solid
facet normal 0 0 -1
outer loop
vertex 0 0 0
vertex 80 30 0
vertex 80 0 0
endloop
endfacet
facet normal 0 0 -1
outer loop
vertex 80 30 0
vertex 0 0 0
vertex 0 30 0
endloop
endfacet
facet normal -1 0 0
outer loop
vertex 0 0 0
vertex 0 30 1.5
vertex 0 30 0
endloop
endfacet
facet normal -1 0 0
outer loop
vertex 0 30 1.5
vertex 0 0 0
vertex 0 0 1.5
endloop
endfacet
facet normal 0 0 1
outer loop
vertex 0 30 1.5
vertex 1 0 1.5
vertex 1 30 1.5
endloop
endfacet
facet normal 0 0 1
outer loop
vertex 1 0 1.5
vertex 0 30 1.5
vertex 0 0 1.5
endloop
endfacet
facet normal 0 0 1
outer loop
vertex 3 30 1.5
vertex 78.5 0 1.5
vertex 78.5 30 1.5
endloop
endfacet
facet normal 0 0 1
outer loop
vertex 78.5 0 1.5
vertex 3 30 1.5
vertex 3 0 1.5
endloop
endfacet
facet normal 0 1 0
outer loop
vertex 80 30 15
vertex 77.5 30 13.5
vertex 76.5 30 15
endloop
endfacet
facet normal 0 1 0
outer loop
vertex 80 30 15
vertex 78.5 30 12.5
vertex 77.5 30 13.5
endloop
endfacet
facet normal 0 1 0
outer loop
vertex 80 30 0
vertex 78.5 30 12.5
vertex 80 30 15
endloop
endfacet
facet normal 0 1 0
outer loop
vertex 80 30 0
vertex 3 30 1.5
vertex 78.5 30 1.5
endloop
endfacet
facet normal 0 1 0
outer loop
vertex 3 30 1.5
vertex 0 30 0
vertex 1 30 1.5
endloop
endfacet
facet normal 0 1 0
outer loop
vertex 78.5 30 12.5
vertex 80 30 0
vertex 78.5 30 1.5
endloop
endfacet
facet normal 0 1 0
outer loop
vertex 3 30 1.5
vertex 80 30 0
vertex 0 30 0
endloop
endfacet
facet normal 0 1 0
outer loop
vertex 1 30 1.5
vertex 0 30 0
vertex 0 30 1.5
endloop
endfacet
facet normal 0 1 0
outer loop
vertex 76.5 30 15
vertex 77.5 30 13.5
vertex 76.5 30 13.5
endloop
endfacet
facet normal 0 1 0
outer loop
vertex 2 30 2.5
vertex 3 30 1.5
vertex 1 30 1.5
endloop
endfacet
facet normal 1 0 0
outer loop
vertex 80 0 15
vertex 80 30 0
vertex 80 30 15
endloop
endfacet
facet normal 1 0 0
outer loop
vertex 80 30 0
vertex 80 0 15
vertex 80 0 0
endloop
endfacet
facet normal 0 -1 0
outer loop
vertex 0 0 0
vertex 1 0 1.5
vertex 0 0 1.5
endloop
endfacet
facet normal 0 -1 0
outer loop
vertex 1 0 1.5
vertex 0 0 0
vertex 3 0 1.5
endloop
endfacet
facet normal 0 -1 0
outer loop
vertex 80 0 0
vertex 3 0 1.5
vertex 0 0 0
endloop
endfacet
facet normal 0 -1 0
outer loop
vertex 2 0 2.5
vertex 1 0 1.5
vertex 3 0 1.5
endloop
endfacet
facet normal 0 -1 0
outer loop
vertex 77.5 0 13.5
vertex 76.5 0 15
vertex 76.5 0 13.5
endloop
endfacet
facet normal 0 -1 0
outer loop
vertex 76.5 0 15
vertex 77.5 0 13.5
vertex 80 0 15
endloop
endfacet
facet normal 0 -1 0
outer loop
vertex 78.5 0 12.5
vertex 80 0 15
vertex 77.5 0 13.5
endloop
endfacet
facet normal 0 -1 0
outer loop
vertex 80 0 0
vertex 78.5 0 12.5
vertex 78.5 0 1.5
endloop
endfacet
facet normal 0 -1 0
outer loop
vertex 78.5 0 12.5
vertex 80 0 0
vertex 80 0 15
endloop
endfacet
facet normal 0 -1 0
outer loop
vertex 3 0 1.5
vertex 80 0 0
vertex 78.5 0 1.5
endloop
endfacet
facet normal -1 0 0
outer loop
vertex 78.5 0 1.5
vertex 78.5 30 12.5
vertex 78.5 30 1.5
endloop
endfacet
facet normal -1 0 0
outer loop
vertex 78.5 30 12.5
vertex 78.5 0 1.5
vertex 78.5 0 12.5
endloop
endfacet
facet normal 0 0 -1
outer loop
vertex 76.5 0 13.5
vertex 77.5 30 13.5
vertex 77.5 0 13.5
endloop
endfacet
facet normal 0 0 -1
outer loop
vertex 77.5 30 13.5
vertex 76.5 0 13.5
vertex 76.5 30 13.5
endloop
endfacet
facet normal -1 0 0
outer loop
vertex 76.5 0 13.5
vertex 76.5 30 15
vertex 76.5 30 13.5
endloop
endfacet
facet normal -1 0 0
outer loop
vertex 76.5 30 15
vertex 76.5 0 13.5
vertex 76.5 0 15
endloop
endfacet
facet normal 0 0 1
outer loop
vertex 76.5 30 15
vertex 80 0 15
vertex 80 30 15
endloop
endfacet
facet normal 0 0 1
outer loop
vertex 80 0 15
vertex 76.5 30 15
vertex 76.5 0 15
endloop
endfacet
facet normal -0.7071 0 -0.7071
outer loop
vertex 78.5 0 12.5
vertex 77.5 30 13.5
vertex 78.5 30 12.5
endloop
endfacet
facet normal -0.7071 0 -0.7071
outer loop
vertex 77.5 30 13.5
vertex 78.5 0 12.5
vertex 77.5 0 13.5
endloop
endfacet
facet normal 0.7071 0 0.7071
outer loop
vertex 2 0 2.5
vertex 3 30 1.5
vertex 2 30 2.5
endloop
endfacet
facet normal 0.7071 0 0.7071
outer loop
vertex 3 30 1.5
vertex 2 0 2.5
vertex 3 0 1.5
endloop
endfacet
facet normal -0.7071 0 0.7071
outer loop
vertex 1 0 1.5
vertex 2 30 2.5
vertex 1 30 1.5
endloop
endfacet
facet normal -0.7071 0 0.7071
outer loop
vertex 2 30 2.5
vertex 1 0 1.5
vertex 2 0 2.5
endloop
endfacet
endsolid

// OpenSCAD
difference(){
    union(){
        linear_extrude(1.5) square([80,30]);
        translate([80,0,1.5]) rotate([0,-90,0]) linear_extrude(1.5) square([12,30]);
        translate([76.5,0,13.5]) linear_extrude(1.5) square([3.5,30]);
        translate([77.5,0,13.5]) rotate([-90,0,0]) linear_extrude(30) polygon([[0,0],[1,0],[1,1]]);
        translate([1,30,1.5]) rotate([90,0,0]) linear_extrude(30)  polygon([[2,0],[1,1],[0,0]]);
    }
}
